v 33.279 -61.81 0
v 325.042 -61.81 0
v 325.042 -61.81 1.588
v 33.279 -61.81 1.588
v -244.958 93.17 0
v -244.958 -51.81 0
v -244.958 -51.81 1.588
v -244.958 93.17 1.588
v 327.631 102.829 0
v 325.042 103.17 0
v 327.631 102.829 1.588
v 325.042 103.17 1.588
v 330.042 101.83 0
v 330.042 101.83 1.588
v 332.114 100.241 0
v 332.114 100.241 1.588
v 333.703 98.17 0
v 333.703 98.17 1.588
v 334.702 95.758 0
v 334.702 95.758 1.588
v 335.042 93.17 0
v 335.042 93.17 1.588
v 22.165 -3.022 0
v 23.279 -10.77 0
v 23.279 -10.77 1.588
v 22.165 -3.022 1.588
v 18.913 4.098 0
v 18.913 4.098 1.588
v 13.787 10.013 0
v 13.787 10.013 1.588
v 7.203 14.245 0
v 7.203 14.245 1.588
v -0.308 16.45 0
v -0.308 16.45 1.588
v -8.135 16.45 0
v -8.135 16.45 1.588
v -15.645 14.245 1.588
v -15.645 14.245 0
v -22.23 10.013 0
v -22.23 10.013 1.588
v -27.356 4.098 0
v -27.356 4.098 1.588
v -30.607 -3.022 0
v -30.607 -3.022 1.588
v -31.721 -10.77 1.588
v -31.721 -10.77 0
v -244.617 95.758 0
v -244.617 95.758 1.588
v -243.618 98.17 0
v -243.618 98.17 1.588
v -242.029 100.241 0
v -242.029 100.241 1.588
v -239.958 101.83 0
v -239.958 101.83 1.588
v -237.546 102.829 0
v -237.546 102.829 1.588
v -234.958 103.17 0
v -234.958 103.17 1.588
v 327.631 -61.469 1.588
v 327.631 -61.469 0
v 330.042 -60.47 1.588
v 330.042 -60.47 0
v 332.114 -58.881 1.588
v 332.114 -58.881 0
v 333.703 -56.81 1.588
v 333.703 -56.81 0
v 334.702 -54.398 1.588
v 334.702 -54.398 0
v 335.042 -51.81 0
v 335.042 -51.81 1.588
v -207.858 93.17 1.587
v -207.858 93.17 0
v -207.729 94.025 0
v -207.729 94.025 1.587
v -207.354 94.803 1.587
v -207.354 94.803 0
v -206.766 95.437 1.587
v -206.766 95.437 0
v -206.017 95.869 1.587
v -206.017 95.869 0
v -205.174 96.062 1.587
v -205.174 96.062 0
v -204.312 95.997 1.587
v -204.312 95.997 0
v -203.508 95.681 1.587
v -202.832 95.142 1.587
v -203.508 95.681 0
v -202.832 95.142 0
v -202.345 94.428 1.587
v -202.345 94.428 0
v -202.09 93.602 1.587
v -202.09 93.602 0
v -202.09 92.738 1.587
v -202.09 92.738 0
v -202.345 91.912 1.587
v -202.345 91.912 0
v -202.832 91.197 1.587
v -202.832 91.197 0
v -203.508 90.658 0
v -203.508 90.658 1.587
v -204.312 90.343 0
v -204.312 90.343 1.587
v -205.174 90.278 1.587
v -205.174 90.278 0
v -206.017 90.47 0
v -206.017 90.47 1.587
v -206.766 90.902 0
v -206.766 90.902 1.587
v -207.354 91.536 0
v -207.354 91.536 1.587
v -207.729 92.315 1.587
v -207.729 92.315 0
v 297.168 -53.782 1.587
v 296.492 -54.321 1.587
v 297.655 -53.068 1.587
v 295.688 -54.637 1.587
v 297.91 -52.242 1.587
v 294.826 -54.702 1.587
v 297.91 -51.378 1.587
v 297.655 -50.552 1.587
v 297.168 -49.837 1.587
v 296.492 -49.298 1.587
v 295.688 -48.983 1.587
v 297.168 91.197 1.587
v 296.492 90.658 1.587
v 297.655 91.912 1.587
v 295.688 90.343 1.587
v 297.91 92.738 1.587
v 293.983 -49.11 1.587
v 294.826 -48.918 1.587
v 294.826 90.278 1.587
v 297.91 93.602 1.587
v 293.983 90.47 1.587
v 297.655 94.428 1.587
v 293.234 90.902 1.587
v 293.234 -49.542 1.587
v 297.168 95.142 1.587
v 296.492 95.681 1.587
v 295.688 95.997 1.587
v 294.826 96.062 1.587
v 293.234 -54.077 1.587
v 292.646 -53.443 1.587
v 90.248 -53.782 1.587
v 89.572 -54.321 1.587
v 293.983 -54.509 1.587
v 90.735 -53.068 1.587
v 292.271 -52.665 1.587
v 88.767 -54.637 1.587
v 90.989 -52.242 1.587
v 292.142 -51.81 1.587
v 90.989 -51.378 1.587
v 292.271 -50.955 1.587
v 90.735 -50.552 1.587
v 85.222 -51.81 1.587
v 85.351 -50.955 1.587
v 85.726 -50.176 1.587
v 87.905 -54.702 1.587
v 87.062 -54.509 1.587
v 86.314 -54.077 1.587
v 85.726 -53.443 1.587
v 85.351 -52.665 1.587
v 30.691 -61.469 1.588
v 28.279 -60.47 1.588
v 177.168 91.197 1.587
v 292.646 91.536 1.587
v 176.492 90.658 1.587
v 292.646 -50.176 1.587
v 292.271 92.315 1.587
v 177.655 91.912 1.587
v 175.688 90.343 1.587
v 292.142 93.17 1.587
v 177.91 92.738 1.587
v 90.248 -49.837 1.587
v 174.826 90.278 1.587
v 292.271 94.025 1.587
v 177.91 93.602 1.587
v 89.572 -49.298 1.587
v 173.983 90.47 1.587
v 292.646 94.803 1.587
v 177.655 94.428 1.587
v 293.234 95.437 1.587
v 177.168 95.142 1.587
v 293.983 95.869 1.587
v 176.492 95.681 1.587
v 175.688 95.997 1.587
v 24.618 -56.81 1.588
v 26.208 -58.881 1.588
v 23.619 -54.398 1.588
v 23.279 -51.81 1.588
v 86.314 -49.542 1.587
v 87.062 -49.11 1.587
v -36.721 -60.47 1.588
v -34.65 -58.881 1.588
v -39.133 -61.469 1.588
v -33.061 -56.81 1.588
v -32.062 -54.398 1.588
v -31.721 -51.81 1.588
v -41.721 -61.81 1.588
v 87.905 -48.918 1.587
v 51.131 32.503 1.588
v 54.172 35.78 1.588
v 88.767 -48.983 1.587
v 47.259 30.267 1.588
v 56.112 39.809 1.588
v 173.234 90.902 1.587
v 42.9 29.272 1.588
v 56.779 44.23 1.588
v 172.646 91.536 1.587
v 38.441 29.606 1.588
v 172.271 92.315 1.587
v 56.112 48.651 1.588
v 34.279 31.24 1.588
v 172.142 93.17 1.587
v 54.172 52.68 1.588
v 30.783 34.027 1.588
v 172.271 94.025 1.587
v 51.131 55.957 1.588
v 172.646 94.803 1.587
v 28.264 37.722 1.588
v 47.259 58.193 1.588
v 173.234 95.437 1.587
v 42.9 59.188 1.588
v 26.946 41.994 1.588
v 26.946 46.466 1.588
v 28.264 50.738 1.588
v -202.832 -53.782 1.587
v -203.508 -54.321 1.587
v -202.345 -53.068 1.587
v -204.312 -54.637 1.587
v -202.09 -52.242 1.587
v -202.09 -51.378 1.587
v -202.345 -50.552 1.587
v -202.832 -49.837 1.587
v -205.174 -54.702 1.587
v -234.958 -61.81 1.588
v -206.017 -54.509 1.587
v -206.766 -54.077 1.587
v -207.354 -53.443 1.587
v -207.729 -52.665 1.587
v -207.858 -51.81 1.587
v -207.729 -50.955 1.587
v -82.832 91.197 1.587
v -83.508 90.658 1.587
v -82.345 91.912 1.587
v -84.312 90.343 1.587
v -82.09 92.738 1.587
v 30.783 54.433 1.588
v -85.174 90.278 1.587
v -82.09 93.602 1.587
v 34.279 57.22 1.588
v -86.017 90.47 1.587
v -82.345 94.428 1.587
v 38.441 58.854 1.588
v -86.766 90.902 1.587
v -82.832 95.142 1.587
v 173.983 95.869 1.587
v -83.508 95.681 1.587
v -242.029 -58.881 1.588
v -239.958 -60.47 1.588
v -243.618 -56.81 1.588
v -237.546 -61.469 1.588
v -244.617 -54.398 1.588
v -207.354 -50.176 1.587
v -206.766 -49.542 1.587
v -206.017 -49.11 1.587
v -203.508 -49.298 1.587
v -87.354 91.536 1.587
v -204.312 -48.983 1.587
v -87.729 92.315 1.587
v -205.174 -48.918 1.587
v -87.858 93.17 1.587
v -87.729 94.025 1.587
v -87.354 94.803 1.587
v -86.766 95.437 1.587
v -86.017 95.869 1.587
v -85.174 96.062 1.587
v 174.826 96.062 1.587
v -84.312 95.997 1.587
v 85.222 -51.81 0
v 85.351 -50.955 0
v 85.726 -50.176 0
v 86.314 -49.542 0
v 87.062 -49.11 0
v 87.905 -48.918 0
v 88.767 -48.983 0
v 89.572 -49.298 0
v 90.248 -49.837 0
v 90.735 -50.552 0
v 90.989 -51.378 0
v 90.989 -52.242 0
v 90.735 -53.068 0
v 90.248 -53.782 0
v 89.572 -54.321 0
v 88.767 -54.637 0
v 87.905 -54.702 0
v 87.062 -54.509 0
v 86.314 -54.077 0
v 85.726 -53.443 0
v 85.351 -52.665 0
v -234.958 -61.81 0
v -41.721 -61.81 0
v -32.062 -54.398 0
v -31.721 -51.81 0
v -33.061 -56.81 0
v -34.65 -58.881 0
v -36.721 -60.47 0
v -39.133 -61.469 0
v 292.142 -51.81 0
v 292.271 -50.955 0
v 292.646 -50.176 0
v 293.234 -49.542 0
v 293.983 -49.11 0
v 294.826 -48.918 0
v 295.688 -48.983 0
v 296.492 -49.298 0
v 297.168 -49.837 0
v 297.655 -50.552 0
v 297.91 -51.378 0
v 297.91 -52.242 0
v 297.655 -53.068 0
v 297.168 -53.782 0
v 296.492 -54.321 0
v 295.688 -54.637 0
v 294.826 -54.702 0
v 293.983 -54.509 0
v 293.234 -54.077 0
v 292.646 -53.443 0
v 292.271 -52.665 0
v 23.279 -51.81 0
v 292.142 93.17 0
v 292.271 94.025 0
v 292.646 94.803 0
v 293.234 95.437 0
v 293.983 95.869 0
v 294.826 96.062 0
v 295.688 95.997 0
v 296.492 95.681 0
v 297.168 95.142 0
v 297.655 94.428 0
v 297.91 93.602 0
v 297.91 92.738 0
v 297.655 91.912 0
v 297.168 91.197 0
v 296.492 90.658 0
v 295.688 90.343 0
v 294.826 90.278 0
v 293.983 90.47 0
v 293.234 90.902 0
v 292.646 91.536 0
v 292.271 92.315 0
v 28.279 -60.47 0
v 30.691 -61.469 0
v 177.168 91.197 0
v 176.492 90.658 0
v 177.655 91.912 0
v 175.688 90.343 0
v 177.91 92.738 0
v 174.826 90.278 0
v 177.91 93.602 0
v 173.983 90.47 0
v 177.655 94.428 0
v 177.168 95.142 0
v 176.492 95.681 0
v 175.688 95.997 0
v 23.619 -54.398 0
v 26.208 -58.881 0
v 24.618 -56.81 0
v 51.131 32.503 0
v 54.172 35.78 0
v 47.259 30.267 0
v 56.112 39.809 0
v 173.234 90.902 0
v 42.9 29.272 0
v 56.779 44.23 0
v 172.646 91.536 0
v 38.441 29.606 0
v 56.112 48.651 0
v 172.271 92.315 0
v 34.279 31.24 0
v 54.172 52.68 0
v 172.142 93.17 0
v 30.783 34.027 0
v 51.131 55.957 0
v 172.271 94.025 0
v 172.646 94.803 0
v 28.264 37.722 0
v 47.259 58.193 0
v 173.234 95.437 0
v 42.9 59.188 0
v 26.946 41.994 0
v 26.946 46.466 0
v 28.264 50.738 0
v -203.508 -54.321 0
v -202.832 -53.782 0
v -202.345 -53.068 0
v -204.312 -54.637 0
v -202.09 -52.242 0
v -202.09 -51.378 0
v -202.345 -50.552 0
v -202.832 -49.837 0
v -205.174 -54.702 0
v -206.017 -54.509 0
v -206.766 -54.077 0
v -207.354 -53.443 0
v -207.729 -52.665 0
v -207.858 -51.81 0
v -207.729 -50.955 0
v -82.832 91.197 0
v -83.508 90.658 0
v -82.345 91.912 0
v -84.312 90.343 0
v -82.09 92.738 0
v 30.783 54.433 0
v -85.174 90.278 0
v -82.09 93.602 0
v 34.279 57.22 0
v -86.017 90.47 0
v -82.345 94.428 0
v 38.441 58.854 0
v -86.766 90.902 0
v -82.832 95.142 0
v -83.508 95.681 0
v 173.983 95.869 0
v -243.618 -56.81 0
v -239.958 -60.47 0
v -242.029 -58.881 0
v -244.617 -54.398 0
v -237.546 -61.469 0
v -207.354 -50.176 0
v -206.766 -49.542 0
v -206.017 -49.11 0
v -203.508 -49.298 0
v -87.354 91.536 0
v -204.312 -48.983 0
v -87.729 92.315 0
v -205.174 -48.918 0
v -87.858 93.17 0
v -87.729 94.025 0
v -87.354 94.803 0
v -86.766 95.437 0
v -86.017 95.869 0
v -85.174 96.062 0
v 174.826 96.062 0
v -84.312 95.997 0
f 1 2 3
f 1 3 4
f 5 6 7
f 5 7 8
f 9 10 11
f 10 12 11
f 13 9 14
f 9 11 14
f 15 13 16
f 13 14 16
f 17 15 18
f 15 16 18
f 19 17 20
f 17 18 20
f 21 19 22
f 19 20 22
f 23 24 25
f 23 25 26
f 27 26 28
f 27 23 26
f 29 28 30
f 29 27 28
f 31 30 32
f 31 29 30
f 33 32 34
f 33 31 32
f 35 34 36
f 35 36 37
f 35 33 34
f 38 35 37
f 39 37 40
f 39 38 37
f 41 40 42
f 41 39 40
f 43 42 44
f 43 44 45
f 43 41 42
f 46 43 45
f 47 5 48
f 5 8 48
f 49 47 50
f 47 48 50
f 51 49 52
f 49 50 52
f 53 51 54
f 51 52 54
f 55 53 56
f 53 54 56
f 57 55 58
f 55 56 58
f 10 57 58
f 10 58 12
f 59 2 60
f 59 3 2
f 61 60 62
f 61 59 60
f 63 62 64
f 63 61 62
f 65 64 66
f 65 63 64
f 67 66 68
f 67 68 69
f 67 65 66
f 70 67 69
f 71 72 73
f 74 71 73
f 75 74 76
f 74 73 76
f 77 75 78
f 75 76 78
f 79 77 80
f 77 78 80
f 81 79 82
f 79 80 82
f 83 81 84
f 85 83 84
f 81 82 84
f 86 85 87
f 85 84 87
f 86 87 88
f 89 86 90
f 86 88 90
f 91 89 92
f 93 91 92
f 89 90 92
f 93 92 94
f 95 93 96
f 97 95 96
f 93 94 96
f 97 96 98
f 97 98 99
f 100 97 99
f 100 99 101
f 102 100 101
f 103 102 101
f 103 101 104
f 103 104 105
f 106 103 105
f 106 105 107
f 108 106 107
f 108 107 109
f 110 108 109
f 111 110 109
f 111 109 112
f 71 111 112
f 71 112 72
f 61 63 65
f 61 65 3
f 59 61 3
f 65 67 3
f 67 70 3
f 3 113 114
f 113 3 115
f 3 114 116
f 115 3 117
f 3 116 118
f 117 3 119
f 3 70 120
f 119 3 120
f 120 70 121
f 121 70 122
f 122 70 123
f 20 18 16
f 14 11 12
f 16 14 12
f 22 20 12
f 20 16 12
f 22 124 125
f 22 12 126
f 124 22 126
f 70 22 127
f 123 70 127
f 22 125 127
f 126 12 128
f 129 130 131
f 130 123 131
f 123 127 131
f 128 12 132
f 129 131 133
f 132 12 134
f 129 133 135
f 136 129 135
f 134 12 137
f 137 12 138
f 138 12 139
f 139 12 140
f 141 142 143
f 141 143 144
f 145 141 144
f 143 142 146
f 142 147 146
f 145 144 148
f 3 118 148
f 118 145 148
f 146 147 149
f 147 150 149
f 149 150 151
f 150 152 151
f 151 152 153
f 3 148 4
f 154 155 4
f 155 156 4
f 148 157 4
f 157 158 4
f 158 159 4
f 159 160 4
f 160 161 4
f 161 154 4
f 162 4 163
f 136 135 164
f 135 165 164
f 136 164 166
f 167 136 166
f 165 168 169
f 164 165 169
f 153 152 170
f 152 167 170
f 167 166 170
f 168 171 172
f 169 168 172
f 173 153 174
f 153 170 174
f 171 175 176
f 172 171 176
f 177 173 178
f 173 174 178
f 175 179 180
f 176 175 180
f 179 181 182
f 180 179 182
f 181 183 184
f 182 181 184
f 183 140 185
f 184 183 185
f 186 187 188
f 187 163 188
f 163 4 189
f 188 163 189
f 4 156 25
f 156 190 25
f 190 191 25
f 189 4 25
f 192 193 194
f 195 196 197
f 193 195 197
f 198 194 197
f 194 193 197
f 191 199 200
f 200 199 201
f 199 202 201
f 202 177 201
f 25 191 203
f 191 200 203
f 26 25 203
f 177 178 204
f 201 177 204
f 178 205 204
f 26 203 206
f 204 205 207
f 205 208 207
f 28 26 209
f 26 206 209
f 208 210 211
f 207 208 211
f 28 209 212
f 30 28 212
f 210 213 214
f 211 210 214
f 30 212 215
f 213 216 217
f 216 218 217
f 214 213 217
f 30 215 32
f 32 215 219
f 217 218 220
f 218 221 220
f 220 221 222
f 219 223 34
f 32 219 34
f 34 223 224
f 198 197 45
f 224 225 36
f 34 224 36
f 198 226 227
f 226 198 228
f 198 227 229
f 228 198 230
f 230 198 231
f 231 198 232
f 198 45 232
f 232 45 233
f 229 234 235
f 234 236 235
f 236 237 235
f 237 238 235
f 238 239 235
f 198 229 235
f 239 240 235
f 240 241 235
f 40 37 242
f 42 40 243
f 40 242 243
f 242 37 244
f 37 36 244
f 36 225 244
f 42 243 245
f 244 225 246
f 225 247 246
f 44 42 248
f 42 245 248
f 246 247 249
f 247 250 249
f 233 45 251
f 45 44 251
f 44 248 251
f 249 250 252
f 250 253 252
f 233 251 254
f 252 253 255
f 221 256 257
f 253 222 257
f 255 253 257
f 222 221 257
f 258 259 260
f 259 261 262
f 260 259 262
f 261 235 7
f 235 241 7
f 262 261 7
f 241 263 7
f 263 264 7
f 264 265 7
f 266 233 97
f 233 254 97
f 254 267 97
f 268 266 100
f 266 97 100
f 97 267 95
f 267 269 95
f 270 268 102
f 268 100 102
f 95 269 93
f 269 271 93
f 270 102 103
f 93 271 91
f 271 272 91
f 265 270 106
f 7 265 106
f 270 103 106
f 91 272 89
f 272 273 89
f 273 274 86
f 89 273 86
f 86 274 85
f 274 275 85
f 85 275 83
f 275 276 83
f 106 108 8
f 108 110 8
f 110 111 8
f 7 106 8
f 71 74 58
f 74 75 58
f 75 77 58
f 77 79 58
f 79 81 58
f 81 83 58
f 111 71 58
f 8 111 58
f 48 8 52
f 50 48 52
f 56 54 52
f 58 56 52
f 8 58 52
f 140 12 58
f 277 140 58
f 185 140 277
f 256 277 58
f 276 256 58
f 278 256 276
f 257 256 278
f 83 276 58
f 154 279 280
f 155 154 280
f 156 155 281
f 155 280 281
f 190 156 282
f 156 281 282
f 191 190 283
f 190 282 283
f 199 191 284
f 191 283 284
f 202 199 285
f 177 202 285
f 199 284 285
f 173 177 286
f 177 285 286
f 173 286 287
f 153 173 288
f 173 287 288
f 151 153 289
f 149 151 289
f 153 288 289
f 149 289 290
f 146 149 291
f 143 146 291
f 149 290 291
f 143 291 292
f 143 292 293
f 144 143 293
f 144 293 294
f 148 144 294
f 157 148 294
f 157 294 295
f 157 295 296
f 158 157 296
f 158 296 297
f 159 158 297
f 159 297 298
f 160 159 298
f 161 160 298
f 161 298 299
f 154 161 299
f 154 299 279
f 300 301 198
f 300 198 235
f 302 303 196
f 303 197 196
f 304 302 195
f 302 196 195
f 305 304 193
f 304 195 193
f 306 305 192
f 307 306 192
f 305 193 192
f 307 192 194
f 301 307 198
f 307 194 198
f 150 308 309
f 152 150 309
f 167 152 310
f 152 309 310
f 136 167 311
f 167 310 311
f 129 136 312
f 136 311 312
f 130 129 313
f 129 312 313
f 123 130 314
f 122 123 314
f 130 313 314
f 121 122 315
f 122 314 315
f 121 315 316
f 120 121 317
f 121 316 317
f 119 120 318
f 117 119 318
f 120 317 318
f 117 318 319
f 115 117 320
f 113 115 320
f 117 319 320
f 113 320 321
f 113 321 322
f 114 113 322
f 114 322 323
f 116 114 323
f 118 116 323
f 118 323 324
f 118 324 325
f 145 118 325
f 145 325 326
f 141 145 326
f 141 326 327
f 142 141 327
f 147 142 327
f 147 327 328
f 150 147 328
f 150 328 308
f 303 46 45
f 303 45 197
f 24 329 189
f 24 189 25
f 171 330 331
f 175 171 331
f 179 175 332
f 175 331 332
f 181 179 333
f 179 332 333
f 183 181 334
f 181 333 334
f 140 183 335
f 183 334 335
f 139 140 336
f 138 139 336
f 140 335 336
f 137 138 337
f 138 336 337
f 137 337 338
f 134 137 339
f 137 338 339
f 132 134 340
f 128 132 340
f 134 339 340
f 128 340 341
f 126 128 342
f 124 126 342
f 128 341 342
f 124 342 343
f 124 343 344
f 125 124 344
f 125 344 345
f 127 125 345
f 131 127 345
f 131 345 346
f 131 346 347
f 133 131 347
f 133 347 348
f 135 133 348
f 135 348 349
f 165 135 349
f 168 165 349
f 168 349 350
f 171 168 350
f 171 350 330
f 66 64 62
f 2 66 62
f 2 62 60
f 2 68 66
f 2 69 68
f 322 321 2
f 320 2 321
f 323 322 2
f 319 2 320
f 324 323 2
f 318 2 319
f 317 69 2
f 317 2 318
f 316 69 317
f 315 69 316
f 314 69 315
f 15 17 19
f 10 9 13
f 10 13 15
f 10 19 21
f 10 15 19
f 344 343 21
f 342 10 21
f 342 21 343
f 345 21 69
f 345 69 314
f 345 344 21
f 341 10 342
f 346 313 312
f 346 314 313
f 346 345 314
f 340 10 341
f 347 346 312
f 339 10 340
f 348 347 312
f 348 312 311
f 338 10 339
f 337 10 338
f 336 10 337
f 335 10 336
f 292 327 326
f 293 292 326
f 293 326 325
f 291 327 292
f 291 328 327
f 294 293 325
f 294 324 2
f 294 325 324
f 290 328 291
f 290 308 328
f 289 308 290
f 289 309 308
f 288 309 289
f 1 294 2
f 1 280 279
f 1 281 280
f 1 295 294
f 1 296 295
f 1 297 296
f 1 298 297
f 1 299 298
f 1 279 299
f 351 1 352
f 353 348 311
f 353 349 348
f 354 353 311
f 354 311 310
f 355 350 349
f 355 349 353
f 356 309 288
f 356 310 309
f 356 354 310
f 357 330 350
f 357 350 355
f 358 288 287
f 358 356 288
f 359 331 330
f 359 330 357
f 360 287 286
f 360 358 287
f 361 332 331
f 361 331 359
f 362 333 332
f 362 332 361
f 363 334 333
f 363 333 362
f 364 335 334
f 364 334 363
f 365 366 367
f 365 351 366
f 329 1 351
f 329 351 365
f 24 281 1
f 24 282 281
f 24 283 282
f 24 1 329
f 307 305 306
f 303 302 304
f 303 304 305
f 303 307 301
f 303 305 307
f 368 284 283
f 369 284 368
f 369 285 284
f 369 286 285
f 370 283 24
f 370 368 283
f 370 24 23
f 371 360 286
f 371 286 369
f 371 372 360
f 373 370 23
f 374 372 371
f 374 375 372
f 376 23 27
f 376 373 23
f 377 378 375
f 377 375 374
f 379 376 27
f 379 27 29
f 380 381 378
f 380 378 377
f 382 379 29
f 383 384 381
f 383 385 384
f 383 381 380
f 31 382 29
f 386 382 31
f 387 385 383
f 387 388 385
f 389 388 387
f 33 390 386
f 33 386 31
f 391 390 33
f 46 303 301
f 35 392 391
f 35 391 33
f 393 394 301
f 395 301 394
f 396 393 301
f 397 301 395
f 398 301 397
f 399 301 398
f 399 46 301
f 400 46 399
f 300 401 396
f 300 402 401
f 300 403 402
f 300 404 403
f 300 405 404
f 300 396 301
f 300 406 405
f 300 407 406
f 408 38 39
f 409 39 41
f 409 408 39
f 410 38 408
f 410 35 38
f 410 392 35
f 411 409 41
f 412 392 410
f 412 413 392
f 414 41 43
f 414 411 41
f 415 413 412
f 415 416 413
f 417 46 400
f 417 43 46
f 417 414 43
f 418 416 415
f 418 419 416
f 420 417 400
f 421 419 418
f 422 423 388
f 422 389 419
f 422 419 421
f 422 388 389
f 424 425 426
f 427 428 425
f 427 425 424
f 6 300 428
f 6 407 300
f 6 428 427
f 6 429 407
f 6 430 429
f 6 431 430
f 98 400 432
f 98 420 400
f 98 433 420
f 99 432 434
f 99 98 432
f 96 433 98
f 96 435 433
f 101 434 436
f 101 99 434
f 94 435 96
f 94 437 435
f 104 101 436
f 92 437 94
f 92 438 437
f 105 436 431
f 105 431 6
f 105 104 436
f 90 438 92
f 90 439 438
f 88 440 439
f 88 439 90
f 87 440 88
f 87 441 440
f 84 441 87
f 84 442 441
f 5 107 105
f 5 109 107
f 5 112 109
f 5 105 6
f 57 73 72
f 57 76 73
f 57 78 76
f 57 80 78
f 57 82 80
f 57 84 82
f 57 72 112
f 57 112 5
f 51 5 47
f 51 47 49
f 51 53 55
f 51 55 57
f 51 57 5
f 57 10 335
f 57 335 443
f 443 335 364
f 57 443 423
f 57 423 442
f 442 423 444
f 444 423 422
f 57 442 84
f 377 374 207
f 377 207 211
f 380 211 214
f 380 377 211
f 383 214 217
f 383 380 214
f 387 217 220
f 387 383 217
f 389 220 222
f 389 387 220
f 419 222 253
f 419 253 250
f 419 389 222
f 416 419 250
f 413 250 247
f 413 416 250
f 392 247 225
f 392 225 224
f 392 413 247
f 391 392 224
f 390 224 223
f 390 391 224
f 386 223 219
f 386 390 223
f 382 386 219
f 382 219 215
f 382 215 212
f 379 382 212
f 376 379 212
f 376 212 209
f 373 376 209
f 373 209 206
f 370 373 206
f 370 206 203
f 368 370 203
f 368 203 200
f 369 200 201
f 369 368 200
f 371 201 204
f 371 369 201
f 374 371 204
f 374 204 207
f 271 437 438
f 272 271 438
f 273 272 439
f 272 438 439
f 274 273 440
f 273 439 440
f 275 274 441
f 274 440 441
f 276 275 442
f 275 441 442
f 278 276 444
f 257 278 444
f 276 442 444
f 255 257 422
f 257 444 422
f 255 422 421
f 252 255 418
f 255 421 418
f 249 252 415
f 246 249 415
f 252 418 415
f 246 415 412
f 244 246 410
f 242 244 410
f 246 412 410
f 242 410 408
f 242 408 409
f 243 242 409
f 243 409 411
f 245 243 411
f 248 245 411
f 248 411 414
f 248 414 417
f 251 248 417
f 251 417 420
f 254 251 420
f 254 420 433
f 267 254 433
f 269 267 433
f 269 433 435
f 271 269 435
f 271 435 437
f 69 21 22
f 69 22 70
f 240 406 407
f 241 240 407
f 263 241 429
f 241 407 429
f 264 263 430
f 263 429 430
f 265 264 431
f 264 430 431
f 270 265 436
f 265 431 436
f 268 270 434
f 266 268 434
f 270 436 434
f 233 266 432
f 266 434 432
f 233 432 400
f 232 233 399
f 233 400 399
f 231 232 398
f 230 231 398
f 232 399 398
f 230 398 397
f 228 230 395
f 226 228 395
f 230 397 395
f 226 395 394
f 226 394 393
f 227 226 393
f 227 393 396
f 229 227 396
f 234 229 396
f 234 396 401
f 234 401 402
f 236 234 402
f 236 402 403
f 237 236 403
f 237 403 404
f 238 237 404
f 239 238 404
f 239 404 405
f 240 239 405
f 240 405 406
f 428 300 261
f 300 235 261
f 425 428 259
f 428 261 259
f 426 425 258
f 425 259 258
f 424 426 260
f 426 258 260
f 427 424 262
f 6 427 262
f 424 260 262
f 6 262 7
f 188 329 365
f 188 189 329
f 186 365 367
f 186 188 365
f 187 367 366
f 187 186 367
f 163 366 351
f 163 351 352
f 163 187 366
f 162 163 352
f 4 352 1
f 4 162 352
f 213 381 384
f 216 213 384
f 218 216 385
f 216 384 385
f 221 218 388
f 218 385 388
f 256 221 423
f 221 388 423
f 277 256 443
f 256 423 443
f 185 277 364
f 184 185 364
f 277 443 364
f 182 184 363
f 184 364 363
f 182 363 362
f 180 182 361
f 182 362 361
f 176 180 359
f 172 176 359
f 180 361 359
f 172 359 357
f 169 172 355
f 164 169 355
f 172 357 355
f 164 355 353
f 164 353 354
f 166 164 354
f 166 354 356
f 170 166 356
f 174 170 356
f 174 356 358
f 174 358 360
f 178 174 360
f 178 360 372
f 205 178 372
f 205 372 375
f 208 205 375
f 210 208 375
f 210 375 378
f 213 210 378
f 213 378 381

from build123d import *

# Parameters (mm, degrees)
SKETCH1_R            = 15
BOSS_EXTRUDE1_DEPTH  = 1.5875
M5_CLEARANCE_HOLE1_D = 5.8
FILLET1_R            = 10


with BuildPart() as part:
    # Sketch1 → Boss-Extrude1 (new body)
    with BuildSketch(Plane.XY):
        with BuildLine():
            Line((-31.721304871, -10.769995549), (-31.721304871, -61.809795549))
            Line((-31.721304871, -61.809795549), (-244.957511762, -61.809795549))
            Line((-244.957511762, -61.809795549), (-244.957511762, 103.169804451))
            Line((-244.957511762, 103.169804451), (335.042488238, 103.169804451))
            Line((335.042488238, 103.169804451), (335.042488238, -61.809795549))
            Line((335.042488238, -61.809795549), (23.278695129, -61.809795549))
            Line((23.278695129, -61.809795549), (23.278695129, -10.769995549))
            ThreePointArc((23.278695129, -10.769995549), (-4.221304871, 16.730004451), (-31.721304871, -10.769995549))
        make_face()
        with Locations((41.778695129, 44.230004451)):
            Circle(SKETCH1_R, mode=Mode.SUBTRACT)
    extrude(amount=BOSS_EXTRUDE1_DEPTH)

    # M5 Clearance Hole1 (through all)
    with Locations(Plane.XY.offset(1.5875)):
        with Locations((-204.957511762, 93.169804451), (-204.957511762, -51.809795549), (88.121775735, -51.809795549), (295.042488238, -51.809795549), (-84.957511762, 93.169804451), (175.042488238, 93.169804451), (295.042488238, 93.169804451)):
            Hole(M5_CLEARANCE_HOLE1_D / 2)

    # Fillet1
    fillet1_edges = [part.edges().sort_by_distance(p)[0] for p in [
        (-244.957511762, 103.169804451, 0.79375),
        (335.042488238, 103.169804451, 0.79375),
        (335.042488238, -61.809795549, 0.79375),
        (23.278695129, -61.809795549, 0.79375),
        (-31.721304871, -61.809795549, 0.79375),
        (-244.957511762, -61.809795549, 0.79375),
    ]]
    fillet(fillet1_edges, radius=FILLET1_R)


solid = part.part
